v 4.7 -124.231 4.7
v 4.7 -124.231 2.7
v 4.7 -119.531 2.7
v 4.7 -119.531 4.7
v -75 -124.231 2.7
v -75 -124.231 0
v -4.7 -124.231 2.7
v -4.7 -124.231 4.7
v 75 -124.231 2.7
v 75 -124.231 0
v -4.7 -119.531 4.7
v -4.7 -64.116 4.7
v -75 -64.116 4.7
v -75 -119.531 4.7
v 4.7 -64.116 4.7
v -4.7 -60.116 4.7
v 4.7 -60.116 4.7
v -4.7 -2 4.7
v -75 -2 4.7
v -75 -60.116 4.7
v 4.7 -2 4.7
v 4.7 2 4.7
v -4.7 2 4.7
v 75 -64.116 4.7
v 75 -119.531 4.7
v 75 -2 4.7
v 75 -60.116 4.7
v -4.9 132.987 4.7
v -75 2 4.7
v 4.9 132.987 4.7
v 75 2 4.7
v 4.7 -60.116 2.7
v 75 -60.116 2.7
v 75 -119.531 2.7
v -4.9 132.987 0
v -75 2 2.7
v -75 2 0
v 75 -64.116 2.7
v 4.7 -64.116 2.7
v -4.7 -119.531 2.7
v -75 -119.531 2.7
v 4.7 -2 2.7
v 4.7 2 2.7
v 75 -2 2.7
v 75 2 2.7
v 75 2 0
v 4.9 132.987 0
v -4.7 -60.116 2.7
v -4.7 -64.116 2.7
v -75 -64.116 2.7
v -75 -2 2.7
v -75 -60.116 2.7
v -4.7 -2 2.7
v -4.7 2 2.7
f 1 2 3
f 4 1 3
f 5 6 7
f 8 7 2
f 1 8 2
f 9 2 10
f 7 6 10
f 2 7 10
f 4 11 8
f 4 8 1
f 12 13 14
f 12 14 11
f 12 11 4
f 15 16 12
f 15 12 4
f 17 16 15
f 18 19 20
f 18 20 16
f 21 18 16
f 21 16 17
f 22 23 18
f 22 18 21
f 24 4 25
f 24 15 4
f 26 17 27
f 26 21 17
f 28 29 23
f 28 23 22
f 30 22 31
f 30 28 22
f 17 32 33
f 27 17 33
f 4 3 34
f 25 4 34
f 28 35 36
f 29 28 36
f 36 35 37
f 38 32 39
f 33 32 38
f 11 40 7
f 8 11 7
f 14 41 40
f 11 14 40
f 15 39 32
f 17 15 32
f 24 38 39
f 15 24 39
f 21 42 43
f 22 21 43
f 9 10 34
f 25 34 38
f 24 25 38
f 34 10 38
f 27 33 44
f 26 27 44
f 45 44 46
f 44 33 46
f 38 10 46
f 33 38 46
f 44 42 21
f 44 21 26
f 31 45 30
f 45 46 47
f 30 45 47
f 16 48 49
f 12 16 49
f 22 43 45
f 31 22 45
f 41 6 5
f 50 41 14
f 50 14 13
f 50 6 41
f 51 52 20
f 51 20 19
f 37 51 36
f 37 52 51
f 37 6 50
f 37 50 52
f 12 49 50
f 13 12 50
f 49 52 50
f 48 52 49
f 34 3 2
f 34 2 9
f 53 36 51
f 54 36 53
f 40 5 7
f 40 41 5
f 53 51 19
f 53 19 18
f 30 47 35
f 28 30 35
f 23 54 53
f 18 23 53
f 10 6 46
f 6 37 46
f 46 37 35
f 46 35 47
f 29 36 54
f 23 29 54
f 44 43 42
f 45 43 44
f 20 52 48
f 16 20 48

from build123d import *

# Parameters (mm, degrees)
F0_W     = 70.3
F0_H     = 58.1155021116
F1_DEPTH = 4.7
F2_DEPTH = 2.7
F0_H_2   = 4
F0_H_3   = 4.7
F3_DEPTH = 2.7


# Not quite as in the source:
# - a feature names something its author has since deleted; it is built from what else it names


with BuildPart() as f1:
    # F0 (on Top) → F1 (new body)
    with BuildSketch(Plane.XY):
        Polygon((0, -2), (0, 0), (0, 2), (-4.7, 2), (-4.7, -2), (-4.7, -60.1155021116), (-4.7, -64.1155021116), (0, -64.1155021116), (0, -62.1155021116), (0, -60.1155021116), align=None)
        Polygon((0, 2), (0, 0), (0, -2), (0, -60.1155021116), (0, -62.1155021116), (0, -64.1155021116), (4.7, -64.1155021116), (4.7, -60.1155021116), (4.7, -2), (4.7, 2), align=None)
        Polygon((-4.7, 2), (0, 2), (0, 132.9871674252), (-4.9, 132.9871674252), (-75, 2), align=None)
        Polygon((0, 132.9871674252), (0, 2), (4.7, 2), (75, 2), (4.9, 132.9871674252), align=None)
        with Locations((-39.85, -31.0577510558)):
            Rectangle(F0_W, F0_H)
        with Locations((39.85, -31.0577510558)):
            Rectangle(F0_W, F0_H)
        Polygon((4.7, -64.1155021116), (0, -64.1155021116), (0, -124.2310042232), (4.7, -124.2310042232), (4.7, -119.5310042232), (75, -119.5310042232), (75, -64.1155021116), align=None)
        Polygon((0, -124.2310042232), (0, -64.1155021116), (-4.7, -64.1155021116), (-75, -64.1155021116), (-75, -119.5310042232), (-4.7, -119.5310042232), (-4.7, -121.7700988054), (-4.7, -124.2310042232), align=None)
    extrude(amount=F1_DEPTH)

    # F0 (on Top) → F2 (join)
    with BuildSketch(Plane.XY):
        Polygon((-4.7, -2), (-4.7, 2), (-75, 2), (-75, 0), (-75, -2), align=None)
        Polygon((75, 2), (4.7, 2), (4.7, -2), (75, -2), (75, 0), align=None)
    extrude(amount=F2_DEPTH)

    # F0 (on Top) → F3 (join)
    with BuildSketch(Plane.XY):
        with Locations((-39.85, -62.1155021116)):
            Rectangle(F0_W, F0_H_2)
        with Locations((39.85, -62.1155021116)):
            Rectangle(F0_W, F0_H_2)
        Polygon((75, 2), (4.7, 2), (4.7, -2), (75, -2), (75, 0), align=None)
        Polygon((-75, -124.2310042232), (-4.7, -124.2310042232), (-4.7, -121.7700988054), (-4.7, -119.5310042232), (-75, -119.5310042232), align=None)
        with Locations((39.85, -121.8810042232)):
            Rectangle(F0_W, F0_H_3)
    extrude(amount=F3_DEPTH)


solid = f1.part
